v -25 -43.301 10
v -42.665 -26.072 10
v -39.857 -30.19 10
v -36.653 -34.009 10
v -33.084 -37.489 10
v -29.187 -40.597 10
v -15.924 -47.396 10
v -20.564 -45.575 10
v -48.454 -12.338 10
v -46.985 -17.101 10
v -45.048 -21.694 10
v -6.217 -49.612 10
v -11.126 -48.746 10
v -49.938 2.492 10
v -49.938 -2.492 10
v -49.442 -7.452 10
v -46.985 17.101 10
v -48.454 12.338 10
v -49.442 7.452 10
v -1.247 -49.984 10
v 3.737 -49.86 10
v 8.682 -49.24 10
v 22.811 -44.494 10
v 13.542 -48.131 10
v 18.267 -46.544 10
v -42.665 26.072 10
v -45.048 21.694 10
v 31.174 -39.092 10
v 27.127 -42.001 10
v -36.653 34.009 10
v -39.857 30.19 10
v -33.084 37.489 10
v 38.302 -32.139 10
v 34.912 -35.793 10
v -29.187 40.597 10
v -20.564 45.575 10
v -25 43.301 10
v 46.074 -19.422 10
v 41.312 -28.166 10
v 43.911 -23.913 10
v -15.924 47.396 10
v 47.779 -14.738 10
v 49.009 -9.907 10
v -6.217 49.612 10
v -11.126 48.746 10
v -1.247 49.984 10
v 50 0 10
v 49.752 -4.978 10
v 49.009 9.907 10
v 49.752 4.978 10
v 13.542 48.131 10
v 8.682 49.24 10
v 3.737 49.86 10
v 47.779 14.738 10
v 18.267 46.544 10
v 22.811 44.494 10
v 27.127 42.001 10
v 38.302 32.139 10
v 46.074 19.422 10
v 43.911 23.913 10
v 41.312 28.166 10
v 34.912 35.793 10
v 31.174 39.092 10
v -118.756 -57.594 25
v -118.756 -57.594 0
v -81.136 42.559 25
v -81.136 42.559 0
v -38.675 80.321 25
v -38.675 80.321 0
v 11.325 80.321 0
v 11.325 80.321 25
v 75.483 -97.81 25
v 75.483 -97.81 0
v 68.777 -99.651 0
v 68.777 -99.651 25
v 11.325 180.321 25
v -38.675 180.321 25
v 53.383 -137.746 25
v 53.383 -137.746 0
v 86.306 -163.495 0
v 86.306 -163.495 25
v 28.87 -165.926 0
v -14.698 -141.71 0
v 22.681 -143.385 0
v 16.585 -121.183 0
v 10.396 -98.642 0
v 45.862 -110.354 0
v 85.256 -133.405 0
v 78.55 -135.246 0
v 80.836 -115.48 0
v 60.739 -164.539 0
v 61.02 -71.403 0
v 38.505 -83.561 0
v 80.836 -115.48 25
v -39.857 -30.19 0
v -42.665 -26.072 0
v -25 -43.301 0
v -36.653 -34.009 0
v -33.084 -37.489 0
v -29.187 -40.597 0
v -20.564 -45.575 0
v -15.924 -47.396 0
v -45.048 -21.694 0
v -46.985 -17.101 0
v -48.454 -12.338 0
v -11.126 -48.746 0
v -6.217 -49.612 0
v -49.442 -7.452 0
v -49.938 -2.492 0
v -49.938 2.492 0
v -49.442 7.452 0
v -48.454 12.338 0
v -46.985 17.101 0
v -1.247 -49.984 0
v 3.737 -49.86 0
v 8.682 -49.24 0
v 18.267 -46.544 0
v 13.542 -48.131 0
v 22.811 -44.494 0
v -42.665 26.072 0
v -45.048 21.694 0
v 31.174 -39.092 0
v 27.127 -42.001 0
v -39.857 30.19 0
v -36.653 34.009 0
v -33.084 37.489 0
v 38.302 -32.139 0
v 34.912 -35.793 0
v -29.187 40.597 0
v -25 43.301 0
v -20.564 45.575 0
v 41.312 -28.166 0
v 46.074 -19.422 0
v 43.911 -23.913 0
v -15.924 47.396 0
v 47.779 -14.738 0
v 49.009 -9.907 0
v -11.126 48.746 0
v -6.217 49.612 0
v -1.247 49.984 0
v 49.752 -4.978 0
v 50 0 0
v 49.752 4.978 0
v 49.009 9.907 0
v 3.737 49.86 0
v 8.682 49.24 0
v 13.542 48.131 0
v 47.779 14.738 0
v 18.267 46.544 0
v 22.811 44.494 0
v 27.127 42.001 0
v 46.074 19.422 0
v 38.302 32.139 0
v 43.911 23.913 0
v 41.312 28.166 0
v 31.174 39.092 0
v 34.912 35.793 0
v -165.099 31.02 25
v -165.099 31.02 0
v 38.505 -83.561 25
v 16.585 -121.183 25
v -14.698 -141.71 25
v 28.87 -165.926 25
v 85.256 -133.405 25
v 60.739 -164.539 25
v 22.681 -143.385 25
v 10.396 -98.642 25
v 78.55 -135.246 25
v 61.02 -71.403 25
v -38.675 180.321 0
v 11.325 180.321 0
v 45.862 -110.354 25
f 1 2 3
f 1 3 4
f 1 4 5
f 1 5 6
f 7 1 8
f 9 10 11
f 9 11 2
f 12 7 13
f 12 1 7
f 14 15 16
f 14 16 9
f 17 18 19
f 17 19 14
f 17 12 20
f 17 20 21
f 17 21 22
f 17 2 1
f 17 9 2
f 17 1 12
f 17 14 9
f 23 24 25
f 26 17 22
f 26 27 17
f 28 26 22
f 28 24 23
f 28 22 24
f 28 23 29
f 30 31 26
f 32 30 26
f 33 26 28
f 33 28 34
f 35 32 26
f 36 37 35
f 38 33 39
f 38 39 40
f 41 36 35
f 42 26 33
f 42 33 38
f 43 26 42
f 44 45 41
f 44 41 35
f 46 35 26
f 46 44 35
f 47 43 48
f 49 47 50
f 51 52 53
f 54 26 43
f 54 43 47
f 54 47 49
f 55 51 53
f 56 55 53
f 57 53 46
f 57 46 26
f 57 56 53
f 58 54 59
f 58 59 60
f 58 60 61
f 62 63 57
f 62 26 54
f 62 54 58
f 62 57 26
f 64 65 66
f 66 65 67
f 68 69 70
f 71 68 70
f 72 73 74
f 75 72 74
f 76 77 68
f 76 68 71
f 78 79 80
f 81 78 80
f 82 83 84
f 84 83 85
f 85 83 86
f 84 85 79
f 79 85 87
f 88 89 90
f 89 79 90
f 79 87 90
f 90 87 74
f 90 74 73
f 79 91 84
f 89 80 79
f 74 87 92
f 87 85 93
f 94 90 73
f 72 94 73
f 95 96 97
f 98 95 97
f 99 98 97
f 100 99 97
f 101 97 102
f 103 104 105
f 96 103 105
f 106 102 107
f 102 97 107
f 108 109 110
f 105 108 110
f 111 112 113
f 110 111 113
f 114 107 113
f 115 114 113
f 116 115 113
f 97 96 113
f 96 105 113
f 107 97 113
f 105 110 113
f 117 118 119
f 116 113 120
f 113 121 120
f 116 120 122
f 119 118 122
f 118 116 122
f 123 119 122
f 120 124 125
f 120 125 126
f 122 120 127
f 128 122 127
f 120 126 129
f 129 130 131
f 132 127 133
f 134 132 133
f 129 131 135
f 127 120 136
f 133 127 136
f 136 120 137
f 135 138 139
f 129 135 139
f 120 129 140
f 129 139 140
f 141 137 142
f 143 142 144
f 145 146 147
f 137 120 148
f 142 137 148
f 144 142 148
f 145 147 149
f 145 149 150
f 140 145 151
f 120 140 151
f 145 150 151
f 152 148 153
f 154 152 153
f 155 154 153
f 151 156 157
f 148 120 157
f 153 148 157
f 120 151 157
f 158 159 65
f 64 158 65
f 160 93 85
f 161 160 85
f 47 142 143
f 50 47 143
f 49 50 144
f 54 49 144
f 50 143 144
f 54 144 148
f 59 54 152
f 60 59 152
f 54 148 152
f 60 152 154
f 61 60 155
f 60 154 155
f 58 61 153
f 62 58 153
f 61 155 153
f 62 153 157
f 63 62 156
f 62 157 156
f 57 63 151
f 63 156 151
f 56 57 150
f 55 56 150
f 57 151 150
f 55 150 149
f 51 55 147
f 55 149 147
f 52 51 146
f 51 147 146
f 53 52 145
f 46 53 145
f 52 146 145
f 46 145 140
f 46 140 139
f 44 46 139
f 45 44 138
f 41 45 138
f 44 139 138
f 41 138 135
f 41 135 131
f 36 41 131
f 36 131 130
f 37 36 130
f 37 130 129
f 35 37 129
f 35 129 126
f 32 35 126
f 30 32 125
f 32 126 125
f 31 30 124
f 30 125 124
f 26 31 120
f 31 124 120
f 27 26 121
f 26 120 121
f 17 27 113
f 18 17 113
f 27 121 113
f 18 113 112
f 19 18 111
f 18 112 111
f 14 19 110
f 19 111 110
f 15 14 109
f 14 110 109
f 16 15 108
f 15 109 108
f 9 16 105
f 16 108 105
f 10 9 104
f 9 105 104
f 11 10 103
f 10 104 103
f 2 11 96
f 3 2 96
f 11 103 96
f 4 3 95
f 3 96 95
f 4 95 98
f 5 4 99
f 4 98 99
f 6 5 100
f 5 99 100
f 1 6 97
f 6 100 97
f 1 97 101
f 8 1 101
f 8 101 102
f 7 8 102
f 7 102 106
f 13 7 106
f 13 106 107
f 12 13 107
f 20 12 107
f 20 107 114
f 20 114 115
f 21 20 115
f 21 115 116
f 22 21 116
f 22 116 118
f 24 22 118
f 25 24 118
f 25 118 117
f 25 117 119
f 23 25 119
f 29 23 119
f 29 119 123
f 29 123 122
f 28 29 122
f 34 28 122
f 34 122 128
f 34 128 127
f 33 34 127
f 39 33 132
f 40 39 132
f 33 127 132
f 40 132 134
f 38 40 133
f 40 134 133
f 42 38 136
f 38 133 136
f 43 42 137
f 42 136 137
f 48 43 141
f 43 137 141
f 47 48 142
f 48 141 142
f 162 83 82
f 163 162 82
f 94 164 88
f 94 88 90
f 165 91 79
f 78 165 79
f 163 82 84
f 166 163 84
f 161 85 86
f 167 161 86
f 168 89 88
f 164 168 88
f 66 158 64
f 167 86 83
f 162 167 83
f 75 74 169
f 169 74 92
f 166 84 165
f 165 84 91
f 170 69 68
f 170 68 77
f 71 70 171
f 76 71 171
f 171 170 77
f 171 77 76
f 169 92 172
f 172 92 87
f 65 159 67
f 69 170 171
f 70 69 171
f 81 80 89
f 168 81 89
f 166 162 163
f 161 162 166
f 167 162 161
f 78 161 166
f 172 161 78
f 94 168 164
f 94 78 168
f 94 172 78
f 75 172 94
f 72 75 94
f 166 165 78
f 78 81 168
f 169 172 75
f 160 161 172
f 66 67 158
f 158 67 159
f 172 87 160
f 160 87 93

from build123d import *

# Parameters (mm, degrees)
F0_R     = 50
F1_DEPTH = 10
F2_W     = 50
F2_H     = 100
F3_DEPTH = 25
F5_DEPTH = 25
F7_DEPTH = 25


with BuildPart() as f1:
    # F0 (on Top) → F1 (new body)
    with BuildSketch(Plane.XY):
        Circle(F0_R)
    extrude(amount=F1_DEPTH)


with BuildPart() as f3:
    # F2 (on Top) → F3 (new body)
    with BuildSketch(Plane.XY):
        with Locations((-13.674594, 130.321365)):
            Rectangle(F2_W, F2_H)
    extrude(amount=F3_DEPTH)


with BuildPart() as f5:
    # F4 (on Top) → F5 (new body)
    with BuildSketch(Plane.XY):
        Polygon((-165.098613, 31.020163), (-118.756424, -57.593614), (-81.135886, 42.559015), align=None)
    extrude(amount=F5_DEPTH)


with BuildPart() as f7:
    # F6 (on Top) → F7 (new body)
    with BuildSketch(Plane.XY):
        Polygon((80.835685, -115.479551), (-14.697704, -141.709819), (28.869888, -165.925875), (22.680873, -143.384835), (60.739134, -164.538654), (53.382641, -137.745536), (86.305767, -163.494736), (78.549706, -135.246346), (85.255907, -133.405048), align=None)
        Polygon((10.395907, -98.641697), (-14.697704, -141.709819), (80.835685, -115.479551), (75.482741, -97.810149), (68.776539, -99.651447), (61.020478, -71.403057), (45.861817, -110.353905), (38.505324, -83.560787), (16.584921, -121.182738), align=None)
    extrude(amount=F7_DEPTH)


solid = Compound([f1.part, f3.part, f5.part, f7.part])
